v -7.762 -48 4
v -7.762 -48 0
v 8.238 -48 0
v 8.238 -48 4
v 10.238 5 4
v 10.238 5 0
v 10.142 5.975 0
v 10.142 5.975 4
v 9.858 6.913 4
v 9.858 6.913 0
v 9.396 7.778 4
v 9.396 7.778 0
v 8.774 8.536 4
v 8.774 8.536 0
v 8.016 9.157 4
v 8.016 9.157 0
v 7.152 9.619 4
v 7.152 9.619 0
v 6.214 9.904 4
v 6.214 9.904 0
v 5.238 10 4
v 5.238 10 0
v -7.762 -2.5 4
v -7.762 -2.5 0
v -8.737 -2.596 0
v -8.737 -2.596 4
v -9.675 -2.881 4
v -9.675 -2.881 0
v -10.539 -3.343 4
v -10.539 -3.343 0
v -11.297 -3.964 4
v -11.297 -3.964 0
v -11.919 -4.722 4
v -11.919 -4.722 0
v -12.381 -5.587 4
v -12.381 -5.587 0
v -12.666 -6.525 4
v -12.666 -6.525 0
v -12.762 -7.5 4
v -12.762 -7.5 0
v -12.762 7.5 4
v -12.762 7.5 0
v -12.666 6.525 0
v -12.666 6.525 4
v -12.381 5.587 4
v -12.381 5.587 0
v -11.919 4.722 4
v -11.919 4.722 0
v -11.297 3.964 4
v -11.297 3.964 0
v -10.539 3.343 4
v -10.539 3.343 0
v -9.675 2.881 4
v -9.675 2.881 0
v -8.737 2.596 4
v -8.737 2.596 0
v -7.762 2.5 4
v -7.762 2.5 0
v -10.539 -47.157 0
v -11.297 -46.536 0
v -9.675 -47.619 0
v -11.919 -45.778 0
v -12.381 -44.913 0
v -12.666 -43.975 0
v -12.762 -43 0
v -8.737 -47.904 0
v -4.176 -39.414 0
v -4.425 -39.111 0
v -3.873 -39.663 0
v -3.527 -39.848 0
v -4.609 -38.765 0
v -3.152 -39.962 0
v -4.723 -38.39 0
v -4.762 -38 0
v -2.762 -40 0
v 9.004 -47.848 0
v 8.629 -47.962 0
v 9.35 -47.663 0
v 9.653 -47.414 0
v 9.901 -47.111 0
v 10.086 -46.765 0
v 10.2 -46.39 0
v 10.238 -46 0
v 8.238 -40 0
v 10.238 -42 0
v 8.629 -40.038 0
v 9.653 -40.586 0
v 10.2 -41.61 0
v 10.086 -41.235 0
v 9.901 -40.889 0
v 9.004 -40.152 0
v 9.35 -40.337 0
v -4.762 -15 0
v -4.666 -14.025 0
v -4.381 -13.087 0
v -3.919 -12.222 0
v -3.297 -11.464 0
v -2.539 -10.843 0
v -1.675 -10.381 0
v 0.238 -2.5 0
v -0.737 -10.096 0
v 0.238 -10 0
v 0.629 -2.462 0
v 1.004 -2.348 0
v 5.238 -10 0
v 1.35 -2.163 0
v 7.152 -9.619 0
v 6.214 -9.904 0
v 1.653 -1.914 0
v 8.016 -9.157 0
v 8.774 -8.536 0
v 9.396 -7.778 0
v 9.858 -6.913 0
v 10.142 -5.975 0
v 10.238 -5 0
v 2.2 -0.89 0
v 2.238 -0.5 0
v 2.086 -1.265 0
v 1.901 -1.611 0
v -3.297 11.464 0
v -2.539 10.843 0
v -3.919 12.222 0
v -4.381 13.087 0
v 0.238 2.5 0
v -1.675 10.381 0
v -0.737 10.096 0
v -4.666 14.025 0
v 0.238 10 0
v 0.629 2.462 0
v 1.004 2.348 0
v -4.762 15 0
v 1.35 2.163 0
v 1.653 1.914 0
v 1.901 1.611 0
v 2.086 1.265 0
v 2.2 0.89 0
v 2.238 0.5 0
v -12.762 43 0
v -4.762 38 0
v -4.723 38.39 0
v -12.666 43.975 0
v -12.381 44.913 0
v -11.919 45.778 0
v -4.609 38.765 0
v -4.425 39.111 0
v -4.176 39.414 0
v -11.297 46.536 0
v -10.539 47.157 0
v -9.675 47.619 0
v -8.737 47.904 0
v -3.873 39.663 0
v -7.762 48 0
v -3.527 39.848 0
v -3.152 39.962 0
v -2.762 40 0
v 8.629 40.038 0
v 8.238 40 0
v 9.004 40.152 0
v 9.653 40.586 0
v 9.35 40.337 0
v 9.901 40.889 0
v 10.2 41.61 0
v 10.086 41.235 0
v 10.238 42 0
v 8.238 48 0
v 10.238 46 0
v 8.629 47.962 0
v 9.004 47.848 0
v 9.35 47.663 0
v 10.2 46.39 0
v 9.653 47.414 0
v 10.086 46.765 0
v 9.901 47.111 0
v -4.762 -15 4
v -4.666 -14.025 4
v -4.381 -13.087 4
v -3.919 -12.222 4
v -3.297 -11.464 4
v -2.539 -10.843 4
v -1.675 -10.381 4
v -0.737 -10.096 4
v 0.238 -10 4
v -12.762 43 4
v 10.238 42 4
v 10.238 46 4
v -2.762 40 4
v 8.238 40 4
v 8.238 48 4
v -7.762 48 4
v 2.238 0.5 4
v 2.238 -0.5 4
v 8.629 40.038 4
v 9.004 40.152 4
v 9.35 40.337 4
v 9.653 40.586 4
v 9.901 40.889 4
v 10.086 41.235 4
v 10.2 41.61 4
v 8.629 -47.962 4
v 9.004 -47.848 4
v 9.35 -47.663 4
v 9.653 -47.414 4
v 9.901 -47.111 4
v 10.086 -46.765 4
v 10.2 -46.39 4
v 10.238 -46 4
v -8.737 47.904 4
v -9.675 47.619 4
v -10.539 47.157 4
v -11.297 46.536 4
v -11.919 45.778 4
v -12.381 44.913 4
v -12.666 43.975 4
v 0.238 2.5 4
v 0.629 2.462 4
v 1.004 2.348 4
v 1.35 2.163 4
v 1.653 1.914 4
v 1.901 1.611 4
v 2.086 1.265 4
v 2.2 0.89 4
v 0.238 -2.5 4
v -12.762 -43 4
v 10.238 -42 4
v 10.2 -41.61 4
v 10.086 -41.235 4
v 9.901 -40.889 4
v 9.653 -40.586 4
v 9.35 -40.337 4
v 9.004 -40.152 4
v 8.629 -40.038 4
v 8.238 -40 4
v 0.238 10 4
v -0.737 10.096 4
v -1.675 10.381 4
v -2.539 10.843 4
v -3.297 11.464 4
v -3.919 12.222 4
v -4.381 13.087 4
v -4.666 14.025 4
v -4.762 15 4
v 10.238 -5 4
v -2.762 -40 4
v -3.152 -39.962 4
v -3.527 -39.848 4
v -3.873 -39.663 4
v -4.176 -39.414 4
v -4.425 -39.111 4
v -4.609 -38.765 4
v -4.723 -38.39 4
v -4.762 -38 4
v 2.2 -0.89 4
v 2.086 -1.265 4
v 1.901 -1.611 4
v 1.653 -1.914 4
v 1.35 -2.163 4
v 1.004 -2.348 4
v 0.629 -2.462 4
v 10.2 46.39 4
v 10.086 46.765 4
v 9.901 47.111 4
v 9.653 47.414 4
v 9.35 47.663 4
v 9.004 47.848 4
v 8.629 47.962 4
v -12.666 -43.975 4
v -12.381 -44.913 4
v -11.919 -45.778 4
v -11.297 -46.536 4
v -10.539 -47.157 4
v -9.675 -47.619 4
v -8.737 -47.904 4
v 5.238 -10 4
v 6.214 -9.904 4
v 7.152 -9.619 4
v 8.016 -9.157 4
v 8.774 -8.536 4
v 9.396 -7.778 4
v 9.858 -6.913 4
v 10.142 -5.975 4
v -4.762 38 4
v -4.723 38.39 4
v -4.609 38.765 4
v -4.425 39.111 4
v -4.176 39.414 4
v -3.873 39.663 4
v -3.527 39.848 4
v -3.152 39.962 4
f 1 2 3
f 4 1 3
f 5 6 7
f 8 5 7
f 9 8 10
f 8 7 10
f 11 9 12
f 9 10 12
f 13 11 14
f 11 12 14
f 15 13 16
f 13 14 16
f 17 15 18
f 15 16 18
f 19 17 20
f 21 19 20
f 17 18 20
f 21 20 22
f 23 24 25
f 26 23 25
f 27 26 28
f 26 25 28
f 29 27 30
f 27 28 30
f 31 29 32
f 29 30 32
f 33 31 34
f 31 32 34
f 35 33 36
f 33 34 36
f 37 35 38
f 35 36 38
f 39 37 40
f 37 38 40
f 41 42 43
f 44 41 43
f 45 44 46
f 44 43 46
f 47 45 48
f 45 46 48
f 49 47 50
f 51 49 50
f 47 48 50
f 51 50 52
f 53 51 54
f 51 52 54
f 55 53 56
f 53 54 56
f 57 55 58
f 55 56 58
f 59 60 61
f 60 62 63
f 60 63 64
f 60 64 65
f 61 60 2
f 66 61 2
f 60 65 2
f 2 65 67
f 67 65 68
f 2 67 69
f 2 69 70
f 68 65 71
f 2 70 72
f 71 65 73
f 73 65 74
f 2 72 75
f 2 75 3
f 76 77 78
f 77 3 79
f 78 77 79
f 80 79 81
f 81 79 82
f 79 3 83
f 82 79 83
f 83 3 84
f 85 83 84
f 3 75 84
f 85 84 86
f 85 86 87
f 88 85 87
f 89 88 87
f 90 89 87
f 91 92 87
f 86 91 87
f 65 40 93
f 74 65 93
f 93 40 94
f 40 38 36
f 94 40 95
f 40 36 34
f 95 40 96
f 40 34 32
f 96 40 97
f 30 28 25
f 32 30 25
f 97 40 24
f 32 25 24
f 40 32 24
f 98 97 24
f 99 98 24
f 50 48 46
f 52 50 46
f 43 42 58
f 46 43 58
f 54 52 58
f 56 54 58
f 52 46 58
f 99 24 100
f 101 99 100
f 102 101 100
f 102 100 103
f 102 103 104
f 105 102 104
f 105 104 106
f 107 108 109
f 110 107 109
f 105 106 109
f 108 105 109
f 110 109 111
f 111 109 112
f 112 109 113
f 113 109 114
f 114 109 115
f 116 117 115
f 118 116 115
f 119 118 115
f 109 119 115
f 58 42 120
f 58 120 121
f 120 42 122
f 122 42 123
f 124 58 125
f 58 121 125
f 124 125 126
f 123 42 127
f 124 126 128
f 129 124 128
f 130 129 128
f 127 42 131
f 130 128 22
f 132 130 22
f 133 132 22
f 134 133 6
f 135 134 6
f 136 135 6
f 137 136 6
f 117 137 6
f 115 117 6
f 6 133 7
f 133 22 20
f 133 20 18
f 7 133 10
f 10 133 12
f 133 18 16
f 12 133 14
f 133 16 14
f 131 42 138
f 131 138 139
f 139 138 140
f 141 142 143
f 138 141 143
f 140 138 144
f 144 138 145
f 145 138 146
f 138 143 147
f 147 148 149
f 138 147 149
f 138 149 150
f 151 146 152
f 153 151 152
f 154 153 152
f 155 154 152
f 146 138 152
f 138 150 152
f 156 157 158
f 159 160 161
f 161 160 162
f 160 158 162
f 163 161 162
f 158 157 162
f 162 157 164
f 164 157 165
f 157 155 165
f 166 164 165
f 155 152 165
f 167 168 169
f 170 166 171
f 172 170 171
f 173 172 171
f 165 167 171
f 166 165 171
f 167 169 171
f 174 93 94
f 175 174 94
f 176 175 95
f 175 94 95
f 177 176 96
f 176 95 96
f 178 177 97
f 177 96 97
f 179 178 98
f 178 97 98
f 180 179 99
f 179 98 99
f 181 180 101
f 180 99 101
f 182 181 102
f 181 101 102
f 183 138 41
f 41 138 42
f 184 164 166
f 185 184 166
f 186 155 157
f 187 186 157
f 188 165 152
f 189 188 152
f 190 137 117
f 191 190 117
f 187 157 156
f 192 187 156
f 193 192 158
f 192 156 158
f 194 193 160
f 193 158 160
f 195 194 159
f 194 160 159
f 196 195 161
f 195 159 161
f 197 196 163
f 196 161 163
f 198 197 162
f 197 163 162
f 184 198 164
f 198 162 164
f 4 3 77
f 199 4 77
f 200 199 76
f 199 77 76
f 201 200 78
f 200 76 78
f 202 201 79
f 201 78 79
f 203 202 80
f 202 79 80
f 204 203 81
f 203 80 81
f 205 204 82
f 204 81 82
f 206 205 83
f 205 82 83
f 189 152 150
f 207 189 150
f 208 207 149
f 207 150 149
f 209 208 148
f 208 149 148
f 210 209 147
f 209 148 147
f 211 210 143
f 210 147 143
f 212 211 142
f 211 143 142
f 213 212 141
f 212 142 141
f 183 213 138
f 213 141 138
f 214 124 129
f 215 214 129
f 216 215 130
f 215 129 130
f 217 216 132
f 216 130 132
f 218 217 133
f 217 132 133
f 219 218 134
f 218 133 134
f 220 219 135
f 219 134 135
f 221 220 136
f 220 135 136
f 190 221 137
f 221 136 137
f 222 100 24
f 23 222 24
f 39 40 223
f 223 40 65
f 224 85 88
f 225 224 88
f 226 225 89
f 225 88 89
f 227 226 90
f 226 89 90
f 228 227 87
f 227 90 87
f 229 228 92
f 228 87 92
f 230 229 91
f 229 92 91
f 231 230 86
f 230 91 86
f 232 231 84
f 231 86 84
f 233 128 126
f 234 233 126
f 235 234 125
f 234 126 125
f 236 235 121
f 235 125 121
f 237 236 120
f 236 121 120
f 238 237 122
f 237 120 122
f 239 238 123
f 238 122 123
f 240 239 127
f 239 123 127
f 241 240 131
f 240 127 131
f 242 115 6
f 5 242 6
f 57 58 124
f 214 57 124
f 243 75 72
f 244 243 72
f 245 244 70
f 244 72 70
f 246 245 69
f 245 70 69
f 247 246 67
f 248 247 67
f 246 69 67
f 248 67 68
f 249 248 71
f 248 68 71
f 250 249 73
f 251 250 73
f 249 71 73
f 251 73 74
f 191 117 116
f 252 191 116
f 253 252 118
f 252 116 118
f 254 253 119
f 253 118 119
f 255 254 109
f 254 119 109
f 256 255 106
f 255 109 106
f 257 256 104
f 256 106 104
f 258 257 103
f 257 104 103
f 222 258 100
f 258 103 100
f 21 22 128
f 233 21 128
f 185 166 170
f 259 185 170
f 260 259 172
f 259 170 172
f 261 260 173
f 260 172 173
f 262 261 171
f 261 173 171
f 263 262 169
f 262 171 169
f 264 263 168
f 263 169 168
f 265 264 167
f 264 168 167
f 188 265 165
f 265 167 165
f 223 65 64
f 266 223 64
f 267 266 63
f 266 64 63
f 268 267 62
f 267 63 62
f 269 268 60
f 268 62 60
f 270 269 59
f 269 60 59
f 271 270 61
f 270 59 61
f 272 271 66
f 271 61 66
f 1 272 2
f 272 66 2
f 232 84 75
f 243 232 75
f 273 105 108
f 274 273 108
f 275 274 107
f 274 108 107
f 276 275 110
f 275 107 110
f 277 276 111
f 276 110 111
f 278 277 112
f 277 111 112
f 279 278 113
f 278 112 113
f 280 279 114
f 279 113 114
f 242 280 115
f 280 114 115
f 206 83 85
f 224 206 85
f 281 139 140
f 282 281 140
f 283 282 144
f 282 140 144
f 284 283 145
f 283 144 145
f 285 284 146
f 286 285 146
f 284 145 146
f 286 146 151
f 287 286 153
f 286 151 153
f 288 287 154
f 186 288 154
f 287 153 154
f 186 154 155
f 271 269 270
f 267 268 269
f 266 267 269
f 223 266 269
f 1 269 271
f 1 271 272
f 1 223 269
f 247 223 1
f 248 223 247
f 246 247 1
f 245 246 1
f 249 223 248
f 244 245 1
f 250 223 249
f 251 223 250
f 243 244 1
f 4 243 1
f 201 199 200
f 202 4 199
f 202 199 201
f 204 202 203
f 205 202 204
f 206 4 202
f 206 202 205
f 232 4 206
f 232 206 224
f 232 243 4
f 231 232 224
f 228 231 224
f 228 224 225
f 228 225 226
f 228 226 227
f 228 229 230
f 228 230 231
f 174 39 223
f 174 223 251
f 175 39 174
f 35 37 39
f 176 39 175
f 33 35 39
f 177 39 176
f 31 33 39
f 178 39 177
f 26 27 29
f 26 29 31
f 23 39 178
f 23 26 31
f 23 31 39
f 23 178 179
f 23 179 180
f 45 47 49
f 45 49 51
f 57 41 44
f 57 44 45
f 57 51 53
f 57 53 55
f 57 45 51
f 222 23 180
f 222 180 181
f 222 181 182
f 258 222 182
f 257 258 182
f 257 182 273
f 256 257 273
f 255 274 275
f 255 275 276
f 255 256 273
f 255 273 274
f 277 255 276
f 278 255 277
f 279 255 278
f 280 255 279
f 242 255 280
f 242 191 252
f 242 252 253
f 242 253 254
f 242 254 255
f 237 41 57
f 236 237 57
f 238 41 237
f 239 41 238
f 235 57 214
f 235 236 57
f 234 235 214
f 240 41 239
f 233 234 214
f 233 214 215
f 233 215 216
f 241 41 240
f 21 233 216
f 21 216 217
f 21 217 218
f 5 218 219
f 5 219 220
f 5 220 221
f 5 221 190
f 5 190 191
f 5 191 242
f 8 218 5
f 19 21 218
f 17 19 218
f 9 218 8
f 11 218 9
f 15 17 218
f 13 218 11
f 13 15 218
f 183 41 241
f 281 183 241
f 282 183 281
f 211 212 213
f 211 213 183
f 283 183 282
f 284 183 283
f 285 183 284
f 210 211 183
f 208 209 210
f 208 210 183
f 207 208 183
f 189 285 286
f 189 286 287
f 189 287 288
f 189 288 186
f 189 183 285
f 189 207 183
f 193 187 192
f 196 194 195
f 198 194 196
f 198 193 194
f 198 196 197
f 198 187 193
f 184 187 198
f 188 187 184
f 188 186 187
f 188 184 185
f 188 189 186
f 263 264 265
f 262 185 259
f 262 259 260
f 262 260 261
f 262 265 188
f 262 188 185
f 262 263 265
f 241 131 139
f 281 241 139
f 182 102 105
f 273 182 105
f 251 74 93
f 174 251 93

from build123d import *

# Parameters (mm, degrees)
F1_DEPTH = 4


with BuildPart() as f1:
    # F0 (on Top) → F1 (new body)
    with BuildSketch(Plane.XY):
        with BuildLine():
            ThreePointArc((10.238371, 46), (9.652584, 47.414214), (8.238371, 48))
            Line((8.238371, 48), (-7.761629, 48))
            ThreePointArc((-7.761629, 48), (-11.297163, 46.535534), (-12.761629, 43))
            Line((-12.761629, 43), (-12.761629, 7.5))
            ThreePointArc((-12.761629, 7.5), (-11.297163, 3.964466), (-7.761629, 2.5))
            Line((-7.761629, 2.5), (0.238371, 2.5))
            ThreePointArc((0.238371, 2.5), (1.652584, 1.914214), (2.238371, 0.5))
            Line((2.238371, 0.5), (2.238371, -0.5))
            ThreePointArc((2.238371, -0.5), (1.652584, -1.914214), (0.238371, -2.5))
            Line((0.238371, -2.5), (-7.761629, -2.5))
            ThreePointArc((-7.761629, -2.5), (-11.297163, -3.964466), (-12.761629, -7.5))
            Line((-12.761629, -7.5), (-12.761629, -43))
            ThreePointArc((-12.761629, -43), (-11.297163, -46.535534), (-7.761629, -48))
            Line((-7.761629, -48), (8.238371, -48))
            ThreePointArc((8.238371, -48), (9.652584, -47.414214), (10.238371, -46))
            Line((10.238371, -46), (10.238371, -42))
            ThreePointArc((10.238371, -42), (9.652584, -40.585786), (8.238371, -40))
            Line((8.238371, -40), (-2.761629, -40))
            ThreePointArc((-2.761629, -40), (-4.175843, -39.414214), (-4.761629, -38))
            Line((-4.761629, -38), (-4.761629, -15))
            ThreePointArc((-4.761629, -15), (-3.297163, -11.464466), (0.238371, -10))
            Line((0.238371, -10), (5.238371, -10))
            ThreePointArc((5.238371, -10), (8.773904, -8.535534), (10.238371, -5))
            Line((10.238371, -5), (10.238371, 5))
            ThreePointArc((10.238371, 5), (8.773904, 8.535534), (5.238371, 10))
            Line((5.238371, 10), (0.238371, 10))
            ThreePointArc((0.238371, 10), (-3.297163, 11.464466), (-4.761629, 15))
            Line((-4.761629, 15), (-4.761629, 38))
            ThreePointArc((-4.761629, 38), (-4.175843, 39.414214), (-2.761629, 40))
            Line((-2.761629, 40), (8.238371, 40))
            ThreePointArc((8.238371, 40), (9.652584, 40.585786), (10.238371, 42))
            Line((10.238371, 42), (10.238371, 46))
        make_face()
    extrude(amount=F1_DEPTH)


solid = f1.part
